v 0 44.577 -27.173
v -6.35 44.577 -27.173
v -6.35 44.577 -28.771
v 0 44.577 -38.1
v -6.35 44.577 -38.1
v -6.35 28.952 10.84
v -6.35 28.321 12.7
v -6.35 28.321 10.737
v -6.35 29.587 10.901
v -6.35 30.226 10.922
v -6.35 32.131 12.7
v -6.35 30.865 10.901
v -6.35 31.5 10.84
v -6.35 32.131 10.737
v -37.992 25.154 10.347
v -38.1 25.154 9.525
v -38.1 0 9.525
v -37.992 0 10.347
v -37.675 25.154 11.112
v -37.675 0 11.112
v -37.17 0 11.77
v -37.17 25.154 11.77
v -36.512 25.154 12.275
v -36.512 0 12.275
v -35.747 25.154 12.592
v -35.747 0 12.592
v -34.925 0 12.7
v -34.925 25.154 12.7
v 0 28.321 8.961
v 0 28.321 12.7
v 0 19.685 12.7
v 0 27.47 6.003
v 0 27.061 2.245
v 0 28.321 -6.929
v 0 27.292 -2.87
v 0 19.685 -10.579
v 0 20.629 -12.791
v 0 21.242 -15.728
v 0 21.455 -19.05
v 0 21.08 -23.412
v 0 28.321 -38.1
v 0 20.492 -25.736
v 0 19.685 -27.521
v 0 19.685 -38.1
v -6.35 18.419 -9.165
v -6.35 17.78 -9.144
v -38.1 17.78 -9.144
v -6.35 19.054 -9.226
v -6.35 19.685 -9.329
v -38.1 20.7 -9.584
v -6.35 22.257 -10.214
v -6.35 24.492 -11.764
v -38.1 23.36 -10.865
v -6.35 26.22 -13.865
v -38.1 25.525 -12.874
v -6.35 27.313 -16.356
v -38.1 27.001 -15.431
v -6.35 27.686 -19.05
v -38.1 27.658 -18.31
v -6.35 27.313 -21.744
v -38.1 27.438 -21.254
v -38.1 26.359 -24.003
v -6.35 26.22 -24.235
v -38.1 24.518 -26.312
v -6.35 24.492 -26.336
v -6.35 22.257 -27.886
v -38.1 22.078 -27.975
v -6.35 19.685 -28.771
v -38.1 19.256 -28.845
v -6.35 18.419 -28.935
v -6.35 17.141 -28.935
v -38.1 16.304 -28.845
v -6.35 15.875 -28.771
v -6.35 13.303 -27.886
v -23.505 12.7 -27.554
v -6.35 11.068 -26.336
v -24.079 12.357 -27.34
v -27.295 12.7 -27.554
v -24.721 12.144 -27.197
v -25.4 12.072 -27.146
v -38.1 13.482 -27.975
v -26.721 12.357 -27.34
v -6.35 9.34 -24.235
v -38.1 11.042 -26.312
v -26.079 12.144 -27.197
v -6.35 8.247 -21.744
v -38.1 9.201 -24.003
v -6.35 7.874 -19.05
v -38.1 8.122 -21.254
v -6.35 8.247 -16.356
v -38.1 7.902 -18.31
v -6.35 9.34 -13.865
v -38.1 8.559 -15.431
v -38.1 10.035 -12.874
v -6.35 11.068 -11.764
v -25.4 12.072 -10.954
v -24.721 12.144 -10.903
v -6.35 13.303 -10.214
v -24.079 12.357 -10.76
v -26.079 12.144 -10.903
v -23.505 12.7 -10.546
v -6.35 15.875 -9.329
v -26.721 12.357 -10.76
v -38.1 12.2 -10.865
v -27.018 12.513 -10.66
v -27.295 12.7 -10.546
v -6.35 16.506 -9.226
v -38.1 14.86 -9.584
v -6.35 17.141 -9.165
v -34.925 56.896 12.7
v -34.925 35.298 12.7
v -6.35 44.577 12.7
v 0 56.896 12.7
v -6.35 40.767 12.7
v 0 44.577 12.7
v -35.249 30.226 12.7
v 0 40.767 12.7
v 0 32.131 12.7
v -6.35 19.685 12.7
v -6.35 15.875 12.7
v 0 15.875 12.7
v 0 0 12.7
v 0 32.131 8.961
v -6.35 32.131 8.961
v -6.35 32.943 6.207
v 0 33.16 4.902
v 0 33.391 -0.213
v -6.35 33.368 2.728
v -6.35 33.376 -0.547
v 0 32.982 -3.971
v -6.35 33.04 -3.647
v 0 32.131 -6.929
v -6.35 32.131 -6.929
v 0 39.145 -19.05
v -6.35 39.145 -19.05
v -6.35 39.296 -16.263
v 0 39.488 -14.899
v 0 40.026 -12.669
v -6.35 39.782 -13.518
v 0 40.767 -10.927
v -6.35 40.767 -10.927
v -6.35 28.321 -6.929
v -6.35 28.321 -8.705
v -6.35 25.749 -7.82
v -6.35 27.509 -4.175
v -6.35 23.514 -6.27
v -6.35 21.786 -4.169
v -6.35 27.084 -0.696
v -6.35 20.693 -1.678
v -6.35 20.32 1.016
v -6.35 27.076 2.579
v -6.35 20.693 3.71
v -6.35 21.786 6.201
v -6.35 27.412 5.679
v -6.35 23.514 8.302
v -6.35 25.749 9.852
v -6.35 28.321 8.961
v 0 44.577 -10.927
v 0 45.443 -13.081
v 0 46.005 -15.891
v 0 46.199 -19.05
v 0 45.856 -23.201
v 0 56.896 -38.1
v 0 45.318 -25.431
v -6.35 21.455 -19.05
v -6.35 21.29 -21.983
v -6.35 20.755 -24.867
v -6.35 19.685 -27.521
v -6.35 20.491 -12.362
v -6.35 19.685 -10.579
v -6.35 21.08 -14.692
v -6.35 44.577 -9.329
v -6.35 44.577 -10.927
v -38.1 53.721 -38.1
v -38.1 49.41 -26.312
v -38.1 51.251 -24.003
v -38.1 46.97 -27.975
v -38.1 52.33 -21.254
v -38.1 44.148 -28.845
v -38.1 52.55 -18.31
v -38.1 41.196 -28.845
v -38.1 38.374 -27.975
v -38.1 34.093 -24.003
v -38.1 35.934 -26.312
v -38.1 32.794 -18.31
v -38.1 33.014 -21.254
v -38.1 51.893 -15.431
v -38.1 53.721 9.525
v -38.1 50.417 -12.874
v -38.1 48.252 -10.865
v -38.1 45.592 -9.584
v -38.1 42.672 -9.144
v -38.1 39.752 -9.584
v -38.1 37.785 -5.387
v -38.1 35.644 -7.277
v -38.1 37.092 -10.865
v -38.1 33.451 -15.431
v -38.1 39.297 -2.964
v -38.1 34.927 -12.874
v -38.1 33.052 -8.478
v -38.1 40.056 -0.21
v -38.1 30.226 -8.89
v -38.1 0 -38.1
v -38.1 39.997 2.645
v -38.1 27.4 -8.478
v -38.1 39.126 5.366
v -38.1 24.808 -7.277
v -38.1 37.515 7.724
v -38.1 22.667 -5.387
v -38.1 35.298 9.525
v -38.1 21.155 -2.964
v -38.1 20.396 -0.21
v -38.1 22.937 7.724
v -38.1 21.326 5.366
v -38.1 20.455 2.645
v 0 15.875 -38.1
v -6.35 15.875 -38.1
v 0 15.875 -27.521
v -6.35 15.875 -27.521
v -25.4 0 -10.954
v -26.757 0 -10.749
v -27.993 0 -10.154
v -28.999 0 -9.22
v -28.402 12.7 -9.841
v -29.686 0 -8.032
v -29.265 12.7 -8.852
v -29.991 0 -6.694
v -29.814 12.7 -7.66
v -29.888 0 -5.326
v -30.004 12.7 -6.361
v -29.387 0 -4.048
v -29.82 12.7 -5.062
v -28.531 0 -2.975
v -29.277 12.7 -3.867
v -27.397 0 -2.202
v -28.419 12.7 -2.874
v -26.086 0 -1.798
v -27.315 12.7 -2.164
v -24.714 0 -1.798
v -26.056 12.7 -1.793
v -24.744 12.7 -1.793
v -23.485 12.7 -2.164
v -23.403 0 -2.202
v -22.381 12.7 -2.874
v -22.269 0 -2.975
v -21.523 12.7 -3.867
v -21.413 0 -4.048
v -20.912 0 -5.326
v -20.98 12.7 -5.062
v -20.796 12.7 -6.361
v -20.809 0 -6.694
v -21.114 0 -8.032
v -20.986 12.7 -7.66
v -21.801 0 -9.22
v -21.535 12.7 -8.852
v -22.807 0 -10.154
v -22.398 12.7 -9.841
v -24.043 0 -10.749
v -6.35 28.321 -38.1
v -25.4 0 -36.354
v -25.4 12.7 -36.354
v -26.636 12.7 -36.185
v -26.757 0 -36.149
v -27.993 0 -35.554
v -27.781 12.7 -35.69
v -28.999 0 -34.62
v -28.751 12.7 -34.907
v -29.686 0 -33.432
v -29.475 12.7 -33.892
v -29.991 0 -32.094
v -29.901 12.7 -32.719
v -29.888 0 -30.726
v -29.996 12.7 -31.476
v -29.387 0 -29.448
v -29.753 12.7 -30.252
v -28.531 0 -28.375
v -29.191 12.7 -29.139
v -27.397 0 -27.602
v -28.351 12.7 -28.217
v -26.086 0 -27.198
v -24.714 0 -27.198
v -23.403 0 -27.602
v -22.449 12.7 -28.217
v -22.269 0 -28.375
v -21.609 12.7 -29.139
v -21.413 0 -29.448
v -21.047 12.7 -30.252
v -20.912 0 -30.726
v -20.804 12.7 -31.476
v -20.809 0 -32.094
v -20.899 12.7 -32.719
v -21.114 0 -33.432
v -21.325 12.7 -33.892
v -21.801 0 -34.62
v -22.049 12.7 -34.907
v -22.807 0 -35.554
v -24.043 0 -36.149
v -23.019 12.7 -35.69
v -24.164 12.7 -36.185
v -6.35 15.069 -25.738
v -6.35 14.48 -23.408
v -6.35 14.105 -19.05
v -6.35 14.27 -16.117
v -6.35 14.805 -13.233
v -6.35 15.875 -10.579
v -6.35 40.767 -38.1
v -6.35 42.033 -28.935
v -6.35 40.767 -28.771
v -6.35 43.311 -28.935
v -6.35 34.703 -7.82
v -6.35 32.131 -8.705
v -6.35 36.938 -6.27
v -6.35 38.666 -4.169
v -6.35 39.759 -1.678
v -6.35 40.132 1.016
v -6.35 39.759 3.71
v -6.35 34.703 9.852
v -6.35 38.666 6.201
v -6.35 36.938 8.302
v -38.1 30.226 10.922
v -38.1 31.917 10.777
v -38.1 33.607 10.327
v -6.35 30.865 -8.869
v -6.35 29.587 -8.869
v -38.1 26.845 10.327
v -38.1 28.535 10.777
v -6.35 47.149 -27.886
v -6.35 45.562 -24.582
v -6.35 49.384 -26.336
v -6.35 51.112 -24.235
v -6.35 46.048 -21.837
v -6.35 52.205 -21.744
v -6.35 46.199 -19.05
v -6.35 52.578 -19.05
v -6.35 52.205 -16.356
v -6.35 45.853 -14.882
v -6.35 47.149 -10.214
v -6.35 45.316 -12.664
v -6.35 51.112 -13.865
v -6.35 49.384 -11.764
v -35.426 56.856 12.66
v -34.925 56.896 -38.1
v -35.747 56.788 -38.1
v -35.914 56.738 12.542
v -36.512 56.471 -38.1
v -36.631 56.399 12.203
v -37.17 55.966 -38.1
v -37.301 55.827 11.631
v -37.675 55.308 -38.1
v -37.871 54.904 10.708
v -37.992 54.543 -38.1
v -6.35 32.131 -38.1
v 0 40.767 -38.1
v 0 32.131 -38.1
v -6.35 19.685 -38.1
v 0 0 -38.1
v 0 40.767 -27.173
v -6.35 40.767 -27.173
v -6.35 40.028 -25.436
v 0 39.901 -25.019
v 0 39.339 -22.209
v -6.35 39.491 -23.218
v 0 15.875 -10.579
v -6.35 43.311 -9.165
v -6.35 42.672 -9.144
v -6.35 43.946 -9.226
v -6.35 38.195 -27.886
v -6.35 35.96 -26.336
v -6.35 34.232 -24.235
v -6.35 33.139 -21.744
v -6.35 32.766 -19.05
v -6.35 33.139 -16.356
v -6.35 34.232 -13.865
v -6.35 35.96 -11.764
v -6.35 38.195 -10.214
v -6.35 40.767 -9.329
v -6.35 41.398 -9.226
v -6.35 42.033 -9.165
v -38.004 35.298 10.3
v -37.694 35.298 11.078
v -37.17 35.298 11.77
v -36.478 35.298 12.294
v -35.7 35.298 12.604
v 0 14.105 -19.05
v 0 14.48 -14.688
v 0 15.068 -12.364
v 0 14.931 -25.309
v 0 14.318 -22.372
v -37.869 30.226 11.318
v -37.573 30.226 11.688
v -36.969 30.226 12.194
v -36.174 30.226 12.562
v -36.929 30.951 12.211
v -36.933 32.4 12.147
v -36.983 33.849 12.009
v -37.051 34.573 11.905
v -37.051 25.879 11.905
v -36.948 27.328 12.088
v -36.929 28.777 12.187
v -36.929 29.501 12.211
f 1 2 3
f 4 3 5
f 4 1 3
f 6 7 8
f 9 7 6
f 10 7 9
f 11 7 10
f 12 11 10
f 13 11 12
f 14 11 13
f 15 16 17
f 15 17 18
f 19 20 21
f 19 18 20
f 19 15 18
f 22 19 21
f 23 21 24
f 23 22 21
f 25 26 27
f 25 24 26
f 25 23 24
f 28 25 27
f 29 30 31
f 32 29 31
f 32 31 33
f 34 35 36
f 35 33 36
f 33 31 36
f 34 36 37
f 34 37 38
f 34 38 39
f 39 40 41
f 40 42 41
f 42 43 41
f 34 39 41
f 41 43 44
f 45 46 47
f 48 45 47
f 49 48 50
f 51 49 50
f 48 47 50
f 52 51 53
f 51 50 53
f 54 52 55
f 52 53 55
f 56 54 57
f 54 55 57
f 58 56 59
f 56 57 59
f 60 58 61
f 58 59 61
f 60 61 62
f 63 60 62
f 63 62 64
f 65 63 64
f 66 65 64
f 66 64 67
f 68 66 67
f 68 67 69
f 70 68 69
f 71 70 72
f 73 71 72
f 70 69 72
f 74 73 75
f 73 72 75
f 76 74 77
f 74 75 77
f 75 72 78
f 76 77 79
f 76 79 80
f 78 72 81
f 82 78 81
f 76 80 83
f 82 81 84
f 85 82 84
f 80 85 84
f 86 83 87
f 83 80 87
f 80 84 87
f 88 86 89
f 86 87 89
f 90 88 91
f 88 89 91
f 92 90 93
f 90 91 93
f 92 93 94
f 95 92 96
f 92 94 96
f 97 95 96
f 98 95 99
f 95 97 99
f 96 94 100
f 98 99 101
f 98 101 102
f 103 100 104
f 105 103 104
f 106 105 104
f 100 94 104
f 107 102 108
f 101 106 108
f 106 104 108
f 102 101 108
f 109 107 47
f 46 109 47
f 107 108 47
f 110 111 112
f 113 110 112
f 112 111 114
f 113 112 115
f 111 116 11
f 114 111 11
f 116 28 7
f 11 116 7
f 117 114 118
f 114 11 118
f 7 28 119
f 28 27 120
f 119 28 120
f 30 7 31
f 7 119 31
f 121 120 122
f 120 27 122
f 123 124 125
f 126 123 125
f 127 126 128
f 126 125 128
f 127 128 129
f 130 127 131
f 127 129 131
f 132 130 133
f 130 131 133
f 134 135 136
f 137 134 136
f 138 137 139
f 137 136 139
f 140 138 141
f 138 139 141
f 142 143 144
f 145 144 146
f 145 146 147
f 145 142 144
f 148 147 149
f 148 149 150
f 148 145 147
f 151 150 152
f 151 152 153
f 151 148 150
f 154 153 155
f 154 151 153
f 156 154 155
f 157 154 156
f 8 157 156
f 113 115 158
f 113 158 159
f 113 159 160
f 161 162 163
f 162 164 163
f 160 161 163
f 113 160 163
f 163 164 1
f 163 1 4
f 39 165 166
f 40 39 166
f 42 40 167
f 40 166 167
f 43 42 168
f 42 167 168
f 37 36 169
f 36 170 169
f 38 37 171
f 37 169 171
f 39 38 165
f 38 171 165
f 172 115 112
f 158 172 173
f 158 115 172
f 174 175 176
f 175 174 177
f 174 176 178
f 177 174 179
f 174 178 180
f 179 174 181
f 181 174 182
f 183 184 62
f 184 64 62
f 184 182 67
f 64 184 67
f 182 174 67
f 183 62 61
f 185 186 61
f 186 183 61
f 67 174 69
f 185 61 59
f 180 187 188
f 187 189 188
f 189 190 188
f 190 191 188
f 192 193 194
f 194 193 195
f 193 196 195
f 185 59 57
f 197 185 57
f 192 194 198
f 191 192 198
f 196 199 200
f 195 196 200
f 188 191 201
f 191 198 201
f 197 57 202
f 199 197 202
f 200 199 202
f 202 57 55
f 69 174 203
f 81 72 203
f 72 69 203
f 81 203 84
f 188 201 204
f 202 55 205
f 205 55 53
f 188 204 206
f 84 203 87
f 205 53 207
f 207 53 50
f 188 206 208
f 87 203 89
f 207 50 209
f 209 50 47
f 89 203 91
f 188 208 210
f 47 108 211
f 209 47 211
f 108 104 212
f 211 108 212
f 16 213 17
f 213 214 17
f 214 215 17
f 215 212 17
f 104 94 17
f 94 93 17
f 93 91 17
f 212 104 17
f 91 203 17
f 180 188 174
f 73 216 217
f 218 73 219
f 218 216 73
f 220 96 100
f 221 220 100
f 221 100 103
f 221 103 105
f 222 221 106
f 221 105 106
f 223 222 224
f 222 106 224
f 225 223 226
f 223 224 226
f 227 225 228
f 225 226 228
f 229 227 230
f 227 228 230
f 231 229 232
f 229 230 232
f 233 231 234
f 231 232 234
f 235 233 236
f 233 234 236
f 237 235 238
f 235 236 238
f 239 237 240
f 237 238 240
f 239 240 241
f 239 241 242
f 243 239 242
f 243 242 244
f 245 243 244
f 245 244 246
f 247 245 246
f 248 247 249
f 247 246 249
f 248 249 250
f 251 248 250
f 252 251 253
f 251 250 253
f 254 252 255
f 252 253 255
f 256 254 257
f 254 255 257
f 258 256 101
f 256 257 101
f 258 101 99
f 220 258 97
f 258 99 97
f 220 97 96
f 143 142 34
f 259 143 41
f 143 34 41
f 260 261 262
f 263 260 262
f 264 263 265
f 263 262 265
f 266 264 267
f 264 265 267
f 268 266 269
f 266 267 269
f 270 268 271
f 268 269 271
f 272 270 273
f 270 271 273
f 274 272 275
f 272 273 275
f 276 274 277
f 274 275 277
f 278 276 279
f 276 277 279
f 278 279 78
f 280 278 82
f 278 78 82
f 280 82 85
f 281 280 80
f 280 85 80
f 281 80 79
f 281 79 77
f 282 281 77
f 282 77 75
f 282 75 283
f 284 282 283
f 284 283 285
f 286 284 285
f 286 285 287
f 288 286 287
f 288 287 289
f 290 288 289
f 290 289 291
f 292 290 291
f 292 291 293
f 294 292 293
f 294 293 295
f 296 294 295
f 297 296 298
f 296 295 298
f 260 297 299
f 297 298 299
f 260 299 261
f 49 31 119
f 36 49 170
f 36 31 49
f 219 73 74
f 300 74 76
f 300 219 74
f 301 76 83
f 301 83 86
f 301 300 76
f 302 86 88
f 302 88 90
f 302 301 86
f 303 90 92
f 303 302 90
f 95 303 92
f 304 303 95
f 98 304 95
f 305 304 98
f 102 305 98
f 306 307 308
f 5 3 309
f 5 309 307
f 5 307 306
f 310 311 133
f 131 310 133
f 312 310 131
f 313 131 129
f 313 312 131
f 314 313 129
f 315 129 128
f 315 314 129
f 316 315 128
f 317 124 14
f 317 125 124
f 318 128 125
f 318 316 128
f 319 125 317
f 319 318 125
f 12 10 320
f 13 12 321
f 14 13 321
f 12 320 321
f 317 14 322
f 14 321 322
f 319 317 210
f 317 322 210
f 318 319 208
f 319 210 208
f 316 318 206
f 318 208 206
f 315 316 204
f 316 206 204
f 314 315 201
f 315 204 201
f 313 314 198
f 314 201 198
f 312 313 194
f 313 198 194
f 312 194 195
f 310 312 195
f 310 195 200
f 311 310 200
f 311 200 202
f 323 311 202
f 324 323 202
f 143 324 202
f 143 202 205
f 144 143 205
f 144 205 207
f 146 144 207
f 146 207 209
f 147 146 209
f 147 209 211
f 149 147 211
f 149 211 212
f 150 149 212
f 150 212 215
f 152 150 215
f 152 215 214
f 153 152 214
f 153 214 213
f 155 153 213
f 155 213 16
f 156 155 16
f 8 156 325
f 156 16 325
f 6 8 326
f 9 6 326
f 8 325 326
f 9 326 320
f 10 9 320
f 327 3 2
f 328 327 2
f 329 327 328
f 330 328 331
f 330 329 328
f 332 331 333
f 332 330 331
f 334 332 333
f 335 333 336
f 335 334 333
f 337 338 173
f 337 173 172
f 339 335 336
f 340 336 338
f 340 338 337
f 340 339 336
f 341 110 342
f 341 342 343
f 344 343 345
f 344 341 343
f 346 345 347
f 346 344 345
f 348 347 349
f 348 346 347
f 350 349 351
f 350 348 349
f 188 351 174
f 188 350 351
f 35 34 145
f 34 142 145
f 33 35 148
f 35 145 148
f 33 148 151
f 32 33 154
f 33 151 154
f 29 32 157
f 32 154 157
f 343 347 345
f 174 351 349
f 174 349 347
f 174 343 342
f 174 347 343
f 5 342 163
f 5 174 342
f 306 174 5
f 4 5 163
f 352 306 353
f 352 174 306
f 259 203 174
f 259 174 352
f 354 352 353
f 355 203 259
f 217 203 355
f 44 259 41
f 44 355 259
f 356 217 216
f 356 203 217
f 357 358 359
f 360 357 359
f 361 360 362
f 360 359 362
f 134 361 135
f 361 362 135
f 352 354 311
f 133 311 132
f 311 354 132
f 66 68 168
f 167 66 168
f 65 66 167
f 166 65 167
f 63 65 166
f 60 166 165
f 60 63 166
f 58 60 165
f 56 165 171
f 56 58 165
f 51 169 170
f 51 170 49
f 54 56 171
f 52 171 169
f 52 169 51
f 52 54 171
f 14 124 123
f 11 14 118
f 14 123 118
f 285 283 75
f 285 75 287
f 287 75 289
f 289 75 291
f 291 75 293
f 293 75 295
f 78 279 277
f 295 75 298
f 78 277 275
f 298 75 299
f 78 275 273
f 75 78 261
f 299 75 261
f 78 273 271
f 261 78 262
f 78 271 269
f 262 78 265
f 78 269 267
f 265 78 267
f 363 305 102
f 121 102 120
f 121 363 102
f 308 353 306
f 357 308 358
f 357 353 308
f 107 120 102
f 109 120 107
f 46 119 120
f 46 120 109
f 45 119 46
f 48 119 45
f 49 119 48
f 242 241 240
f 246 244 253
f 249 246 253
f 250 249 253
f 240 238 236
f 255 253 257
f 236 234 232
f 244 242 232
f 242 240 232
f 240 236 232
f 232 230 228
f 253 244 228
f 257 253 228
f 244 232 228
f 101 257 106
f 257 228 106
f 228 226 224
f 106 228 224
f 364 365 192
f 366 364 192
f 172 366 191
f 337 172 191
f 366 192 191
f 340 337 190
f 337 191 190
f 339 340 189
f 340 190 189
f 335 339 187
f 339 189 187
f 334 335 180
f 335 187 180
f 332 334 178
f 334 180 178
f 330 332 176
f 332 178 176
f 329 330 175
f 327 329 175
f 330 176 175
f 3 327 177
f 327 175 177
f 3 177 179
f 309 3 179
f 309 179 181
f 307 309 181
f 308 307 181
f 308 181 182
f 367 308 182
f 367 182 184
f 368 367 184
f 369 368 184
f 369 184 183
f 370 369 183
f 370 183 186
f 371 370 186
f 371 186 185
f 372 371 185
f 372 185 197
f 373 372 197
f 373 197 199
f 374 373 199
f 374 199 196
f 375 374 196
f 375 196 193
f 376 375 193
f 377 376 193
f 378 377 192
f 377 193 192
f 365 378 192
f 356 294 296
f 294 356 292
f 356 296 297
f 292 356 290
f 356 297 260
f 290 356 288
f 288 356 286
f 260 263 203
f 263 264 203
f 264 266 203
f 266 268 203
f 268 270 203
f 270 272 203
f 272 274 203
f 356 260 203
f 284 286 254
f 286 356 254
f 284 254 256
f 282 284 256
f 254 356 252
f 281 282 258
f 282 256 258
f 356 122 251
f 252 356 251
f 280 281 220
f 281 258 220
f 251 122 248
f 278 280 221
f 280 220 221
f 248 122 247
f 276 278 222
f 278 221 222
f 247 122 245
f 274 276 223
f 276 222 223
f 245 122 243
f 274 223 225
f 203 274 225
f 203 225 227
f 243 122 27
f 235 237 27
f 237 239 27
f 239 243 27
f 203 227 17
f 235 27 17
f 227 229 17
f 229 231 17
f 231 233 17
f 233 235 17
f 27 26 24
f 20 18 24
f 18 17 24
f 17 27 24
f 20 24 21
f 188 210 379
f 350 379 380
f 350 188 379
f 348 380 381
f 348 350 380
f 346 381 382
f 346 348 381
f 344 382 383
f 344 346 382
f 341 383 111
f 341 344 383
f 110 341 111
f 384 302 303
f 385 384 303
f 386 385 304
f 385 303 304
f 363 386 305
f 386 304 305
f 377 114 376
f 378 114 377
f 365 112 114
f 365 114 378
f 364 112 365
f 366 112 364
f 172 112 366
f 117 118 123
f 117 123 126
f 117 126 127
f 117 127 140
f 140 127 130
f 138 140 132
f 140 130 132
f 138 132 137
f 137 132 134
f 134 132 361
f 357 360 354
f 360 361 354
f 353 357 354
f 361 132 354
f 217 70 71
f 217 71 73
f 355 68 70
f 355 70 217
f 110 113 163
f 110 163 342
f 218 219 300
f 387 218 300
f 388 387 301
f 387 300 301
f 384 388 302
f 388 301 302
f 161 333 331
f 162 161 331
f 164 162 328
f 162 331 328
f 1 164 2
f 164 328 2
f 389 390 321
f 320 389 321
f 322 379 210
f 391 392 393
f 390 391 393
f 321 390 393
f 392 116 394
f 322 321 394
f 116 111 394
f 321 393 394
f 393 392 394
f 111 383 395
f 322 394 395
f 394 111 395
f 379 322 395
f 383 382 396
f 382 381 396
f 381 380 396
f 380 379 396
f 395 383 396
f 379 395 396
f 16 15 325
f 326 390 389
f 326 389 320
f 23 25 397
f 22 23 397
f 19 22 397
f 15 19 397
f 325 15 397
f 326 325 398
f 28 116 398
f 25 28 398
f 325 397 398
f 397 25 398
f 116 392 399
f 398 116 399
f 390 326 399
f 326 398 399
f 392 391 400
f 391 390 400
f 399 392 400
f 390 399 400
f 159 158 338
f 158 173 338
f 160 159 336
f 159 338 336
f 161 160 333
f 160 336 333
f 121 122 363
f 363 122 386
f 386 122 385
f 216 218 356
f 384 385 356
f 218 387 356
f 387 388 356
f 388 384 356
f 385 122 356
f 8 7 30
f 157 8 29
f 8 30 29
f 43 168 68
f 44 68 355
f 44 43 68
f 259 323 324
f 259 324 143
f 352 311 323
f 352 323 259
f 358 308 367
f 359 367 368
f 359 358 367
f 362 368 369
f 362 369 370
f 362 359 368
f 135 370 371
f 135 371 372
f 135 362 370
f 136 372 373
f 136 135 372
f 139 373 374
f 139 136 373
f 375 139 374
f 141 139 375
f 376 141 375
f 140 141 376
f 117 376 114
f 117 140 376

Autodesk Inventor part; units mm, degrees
ref_plane "YZ Plane" through (0, 0, 0) normal (1, 0, 0) x (0, 1, 0)
ref_plane "XZ Plane" through (0, 0, 0) normal (0, 1, 0) x (-1, 0, 0)
ref_plane "XY Plane" through (0, 0, 0) normal (0, 0, 1) x (1, 0, 0)
sketch "Sketch1" plane through (0, 0, 0) normal (0, 1, 0) x (-1, 0, 0)
  line L0 (0, 0) -> (38.1, 0)
  line L1 (38.1, 0) -> (38.1, -38.1)
  line L2 (38.1, -38.1) -> (0, -38.1)
  line L3 (0, -38.1) -> (0, 0)
  line L4 (0, -38.1) -> (0, -31.75)
  line L5 (0, -38.1) -> (6.35, -38.1) construction
  line L6 (0, -31.75) -> (25.4, -31.75)
  line L7 (25.4, -31.75) -> (25.4, -6.35)
  line L8 (0, 0) -> (0, -38.1)
  line L9 (0, 0) -> (38.1, 0)
  line L10 (38.1, 0) -> (38.1, 12.7)
  line L11 (38.1, 12.7) -> (0, 12.7)
  line L12 (0, 12.7) -> (0, 0)
  dimension "d0" = 38.1
  dimension "d1" = 38.1
  dimension "d2" = 6.35
  dimension "d3" = 90
  dimension "d4" = 25.4
  dimension "d5" = 90
  dimension "d6" = 25.4
  dimension "d34" = 38.1
  dimension "d35" = 12.7
extrude "Extrusion1" add sketch "Sketch1" along normal blind 56.896
hole "Hole1" at (-25.4, 0, -31.75) at (-25.4, 0, -6.35) direction (0, 1, 0) diameter 9.2075 depth 12.7
sketch "Sketch2" plane through (-38.1, 0, -38.1) normal (-1, 0, 0) x (0, 0, 1)
  line L0 (19.05, 0) -> (19.05, 17.78)
  line L1 (19.05, 0) -> (36.83, 0) construction
  line L2 (19.05, 17.78) -> (19.05, 27.686)
  line L3 (19.05, 17.78) -> (28.956, 17.78) construction
  line L4 (19.05, 27.686) -> (19.05, 32.766)
  line L5 (19.05, 32.766) -> (19.05, 42.672)
  circle A0 centre (19.05, 17.78) radius 9.906
  circle A1 centre (19.05, 42.672) radius 9.906
  ellipse E0 centre (19.05, 42.672) end of major axis (28.702, 42.672) minor radius 3.5267
  ellipse E1 centre (19.05, 17.78) end of major axis (28.956, 17.78) minor radius 3.6751
  line L6 (19.05, 42.672) -> (19.05, 57.404)
  line L7 (19.05, 30.226) -> (29.21, 30.226)
  line L8 (29.21, 30.226) -> (39.116, 30.226)
  circle A2 centre (39.116, 30.226) radius 9.906
  ellipse E2 centre (39.116, 30.226) end of major axis (29.21, 30.226) minor radius 3.1895
  dimension "d16" = 17.78
  dimension "d17" = 90
  dimension "d18" = 9.906
  dimension "d19" = 90
  dimension "d20" = 5.08
  dimension "d21" = 180
  dimension "d22" = 9.906
  dimension "d23" = 180
  dimension "d32" = 14.732
  dimension "d36" = 10.16
  dimension "d37" = 9.906
  dimension "d38" = 19.812
extrude "Extrusion2" cut sketch "Sketch2" against normal blind 31.75
extrude "Extrusion3" cut sketch "Sketch2" against normal blind 38.1 contours E2 | E1 L2 L0 | L0 L2 E1 | E0 L6 L5 | L5 L6 E0
sketch "Sketch3" plane through (0, 0, 0) normal (1, 0, 0) x (0, 0, -1)
  line L0 (38.1, 0) -> (38.1, 56.896) projected
  line L1 (0, 44.577) -> (38.1, 44.577)
  line L2 (38.1, 44.577) -> (38.1, 40.767)
  line L3 (38.1, 40.767) -> (0, 40.767)
  line L4 (0, 40.767) -> (0, 44.577)
  line L5 (0, 44.577) -> (38.1, 40.767) construction
  line L6 (38.1, 44.577) -> (0, 40.767) construction
  line L7 (0, 19.685) -> (38.1, 19.685)
  line L8 (38.1, 19.685) -> (38.1, 15.875)
  line L9 (38.1, 15.875) -> (0, 15.875)
  line L10 (0, 15.875) -> (0, 19.685)
  line L11 (0, 19.685) -> (38.1, 15.875) construction
  line L12 (38.1, 19.685) -> (0, 15.875) construction
  line L13 (-12.7, 0) -> (-12.7, 56.896) projected
  line L14 (0, 15.875) -> (-12.7, 15.875)
  line L15 (-12.7, 15.875) -> (-12.7, 19.685)
  line L16 (-12.7, 19.685) -> (0, 19.685)
  line L17 (0, 19.685) -> (0, 15.875)
  line L18 (0, 40.767) -> (-12.7, 40.767)
  line L19 (-12.7, 40.767) -> (-12.7, 44.577)
  line L20 (-12.7, 44.577) -> (0, 44.577)
  line L21 (0, 44.577) -> (0, 40.767)
  line L22 (-12.7, 0) -> (-12.7, 56.896) projected
  line L23 (38.1, 0) -> (38.1, 56.896) projected
  line L24 (-40.132, 28.321) -> (38.1, 28.321)
  line L25 (38.1, 28.321) -> (38.1, 32.131)
  line L26 (38.1, 32.131) -> (-40.132, 32.131)
  line L27 (-40.132, 32.131) -> (-40.132, 28.321)
  line L28 (-40.132, 28.321) -> (38.1, 32.131) construction
  line L29 (38.1, 28.321) -> (-40.132, 32.131) construction
  point P0 (0, 0)
  point P1 (19.05, 17.78)
  point P2 (19.05, 42.672)
  point P3 (-1.016, 30.226)
  point P4 (38.1, 28.321)
  dimension "d28" = 3.81
  dimension "d29" = 3.81
  dimension "d39" = 3.81
extrude "Extrusion4" cut sketch "Sketch3" against normal blind 6.35 contours L9 L10 L7 L0 | L14 L13 L16 L10 | L24 L13 L26 L0 | L24 L27 L26 L13 | L3 L4 L1 L0 | L18 L13 L20 L4
fillet "Fillet1" radius 3.175 2 edges at (-38.1, 56.896, -12.7) (-38.1, 28.448, 12.7)
properties part number "Valve Holder-3valve"
